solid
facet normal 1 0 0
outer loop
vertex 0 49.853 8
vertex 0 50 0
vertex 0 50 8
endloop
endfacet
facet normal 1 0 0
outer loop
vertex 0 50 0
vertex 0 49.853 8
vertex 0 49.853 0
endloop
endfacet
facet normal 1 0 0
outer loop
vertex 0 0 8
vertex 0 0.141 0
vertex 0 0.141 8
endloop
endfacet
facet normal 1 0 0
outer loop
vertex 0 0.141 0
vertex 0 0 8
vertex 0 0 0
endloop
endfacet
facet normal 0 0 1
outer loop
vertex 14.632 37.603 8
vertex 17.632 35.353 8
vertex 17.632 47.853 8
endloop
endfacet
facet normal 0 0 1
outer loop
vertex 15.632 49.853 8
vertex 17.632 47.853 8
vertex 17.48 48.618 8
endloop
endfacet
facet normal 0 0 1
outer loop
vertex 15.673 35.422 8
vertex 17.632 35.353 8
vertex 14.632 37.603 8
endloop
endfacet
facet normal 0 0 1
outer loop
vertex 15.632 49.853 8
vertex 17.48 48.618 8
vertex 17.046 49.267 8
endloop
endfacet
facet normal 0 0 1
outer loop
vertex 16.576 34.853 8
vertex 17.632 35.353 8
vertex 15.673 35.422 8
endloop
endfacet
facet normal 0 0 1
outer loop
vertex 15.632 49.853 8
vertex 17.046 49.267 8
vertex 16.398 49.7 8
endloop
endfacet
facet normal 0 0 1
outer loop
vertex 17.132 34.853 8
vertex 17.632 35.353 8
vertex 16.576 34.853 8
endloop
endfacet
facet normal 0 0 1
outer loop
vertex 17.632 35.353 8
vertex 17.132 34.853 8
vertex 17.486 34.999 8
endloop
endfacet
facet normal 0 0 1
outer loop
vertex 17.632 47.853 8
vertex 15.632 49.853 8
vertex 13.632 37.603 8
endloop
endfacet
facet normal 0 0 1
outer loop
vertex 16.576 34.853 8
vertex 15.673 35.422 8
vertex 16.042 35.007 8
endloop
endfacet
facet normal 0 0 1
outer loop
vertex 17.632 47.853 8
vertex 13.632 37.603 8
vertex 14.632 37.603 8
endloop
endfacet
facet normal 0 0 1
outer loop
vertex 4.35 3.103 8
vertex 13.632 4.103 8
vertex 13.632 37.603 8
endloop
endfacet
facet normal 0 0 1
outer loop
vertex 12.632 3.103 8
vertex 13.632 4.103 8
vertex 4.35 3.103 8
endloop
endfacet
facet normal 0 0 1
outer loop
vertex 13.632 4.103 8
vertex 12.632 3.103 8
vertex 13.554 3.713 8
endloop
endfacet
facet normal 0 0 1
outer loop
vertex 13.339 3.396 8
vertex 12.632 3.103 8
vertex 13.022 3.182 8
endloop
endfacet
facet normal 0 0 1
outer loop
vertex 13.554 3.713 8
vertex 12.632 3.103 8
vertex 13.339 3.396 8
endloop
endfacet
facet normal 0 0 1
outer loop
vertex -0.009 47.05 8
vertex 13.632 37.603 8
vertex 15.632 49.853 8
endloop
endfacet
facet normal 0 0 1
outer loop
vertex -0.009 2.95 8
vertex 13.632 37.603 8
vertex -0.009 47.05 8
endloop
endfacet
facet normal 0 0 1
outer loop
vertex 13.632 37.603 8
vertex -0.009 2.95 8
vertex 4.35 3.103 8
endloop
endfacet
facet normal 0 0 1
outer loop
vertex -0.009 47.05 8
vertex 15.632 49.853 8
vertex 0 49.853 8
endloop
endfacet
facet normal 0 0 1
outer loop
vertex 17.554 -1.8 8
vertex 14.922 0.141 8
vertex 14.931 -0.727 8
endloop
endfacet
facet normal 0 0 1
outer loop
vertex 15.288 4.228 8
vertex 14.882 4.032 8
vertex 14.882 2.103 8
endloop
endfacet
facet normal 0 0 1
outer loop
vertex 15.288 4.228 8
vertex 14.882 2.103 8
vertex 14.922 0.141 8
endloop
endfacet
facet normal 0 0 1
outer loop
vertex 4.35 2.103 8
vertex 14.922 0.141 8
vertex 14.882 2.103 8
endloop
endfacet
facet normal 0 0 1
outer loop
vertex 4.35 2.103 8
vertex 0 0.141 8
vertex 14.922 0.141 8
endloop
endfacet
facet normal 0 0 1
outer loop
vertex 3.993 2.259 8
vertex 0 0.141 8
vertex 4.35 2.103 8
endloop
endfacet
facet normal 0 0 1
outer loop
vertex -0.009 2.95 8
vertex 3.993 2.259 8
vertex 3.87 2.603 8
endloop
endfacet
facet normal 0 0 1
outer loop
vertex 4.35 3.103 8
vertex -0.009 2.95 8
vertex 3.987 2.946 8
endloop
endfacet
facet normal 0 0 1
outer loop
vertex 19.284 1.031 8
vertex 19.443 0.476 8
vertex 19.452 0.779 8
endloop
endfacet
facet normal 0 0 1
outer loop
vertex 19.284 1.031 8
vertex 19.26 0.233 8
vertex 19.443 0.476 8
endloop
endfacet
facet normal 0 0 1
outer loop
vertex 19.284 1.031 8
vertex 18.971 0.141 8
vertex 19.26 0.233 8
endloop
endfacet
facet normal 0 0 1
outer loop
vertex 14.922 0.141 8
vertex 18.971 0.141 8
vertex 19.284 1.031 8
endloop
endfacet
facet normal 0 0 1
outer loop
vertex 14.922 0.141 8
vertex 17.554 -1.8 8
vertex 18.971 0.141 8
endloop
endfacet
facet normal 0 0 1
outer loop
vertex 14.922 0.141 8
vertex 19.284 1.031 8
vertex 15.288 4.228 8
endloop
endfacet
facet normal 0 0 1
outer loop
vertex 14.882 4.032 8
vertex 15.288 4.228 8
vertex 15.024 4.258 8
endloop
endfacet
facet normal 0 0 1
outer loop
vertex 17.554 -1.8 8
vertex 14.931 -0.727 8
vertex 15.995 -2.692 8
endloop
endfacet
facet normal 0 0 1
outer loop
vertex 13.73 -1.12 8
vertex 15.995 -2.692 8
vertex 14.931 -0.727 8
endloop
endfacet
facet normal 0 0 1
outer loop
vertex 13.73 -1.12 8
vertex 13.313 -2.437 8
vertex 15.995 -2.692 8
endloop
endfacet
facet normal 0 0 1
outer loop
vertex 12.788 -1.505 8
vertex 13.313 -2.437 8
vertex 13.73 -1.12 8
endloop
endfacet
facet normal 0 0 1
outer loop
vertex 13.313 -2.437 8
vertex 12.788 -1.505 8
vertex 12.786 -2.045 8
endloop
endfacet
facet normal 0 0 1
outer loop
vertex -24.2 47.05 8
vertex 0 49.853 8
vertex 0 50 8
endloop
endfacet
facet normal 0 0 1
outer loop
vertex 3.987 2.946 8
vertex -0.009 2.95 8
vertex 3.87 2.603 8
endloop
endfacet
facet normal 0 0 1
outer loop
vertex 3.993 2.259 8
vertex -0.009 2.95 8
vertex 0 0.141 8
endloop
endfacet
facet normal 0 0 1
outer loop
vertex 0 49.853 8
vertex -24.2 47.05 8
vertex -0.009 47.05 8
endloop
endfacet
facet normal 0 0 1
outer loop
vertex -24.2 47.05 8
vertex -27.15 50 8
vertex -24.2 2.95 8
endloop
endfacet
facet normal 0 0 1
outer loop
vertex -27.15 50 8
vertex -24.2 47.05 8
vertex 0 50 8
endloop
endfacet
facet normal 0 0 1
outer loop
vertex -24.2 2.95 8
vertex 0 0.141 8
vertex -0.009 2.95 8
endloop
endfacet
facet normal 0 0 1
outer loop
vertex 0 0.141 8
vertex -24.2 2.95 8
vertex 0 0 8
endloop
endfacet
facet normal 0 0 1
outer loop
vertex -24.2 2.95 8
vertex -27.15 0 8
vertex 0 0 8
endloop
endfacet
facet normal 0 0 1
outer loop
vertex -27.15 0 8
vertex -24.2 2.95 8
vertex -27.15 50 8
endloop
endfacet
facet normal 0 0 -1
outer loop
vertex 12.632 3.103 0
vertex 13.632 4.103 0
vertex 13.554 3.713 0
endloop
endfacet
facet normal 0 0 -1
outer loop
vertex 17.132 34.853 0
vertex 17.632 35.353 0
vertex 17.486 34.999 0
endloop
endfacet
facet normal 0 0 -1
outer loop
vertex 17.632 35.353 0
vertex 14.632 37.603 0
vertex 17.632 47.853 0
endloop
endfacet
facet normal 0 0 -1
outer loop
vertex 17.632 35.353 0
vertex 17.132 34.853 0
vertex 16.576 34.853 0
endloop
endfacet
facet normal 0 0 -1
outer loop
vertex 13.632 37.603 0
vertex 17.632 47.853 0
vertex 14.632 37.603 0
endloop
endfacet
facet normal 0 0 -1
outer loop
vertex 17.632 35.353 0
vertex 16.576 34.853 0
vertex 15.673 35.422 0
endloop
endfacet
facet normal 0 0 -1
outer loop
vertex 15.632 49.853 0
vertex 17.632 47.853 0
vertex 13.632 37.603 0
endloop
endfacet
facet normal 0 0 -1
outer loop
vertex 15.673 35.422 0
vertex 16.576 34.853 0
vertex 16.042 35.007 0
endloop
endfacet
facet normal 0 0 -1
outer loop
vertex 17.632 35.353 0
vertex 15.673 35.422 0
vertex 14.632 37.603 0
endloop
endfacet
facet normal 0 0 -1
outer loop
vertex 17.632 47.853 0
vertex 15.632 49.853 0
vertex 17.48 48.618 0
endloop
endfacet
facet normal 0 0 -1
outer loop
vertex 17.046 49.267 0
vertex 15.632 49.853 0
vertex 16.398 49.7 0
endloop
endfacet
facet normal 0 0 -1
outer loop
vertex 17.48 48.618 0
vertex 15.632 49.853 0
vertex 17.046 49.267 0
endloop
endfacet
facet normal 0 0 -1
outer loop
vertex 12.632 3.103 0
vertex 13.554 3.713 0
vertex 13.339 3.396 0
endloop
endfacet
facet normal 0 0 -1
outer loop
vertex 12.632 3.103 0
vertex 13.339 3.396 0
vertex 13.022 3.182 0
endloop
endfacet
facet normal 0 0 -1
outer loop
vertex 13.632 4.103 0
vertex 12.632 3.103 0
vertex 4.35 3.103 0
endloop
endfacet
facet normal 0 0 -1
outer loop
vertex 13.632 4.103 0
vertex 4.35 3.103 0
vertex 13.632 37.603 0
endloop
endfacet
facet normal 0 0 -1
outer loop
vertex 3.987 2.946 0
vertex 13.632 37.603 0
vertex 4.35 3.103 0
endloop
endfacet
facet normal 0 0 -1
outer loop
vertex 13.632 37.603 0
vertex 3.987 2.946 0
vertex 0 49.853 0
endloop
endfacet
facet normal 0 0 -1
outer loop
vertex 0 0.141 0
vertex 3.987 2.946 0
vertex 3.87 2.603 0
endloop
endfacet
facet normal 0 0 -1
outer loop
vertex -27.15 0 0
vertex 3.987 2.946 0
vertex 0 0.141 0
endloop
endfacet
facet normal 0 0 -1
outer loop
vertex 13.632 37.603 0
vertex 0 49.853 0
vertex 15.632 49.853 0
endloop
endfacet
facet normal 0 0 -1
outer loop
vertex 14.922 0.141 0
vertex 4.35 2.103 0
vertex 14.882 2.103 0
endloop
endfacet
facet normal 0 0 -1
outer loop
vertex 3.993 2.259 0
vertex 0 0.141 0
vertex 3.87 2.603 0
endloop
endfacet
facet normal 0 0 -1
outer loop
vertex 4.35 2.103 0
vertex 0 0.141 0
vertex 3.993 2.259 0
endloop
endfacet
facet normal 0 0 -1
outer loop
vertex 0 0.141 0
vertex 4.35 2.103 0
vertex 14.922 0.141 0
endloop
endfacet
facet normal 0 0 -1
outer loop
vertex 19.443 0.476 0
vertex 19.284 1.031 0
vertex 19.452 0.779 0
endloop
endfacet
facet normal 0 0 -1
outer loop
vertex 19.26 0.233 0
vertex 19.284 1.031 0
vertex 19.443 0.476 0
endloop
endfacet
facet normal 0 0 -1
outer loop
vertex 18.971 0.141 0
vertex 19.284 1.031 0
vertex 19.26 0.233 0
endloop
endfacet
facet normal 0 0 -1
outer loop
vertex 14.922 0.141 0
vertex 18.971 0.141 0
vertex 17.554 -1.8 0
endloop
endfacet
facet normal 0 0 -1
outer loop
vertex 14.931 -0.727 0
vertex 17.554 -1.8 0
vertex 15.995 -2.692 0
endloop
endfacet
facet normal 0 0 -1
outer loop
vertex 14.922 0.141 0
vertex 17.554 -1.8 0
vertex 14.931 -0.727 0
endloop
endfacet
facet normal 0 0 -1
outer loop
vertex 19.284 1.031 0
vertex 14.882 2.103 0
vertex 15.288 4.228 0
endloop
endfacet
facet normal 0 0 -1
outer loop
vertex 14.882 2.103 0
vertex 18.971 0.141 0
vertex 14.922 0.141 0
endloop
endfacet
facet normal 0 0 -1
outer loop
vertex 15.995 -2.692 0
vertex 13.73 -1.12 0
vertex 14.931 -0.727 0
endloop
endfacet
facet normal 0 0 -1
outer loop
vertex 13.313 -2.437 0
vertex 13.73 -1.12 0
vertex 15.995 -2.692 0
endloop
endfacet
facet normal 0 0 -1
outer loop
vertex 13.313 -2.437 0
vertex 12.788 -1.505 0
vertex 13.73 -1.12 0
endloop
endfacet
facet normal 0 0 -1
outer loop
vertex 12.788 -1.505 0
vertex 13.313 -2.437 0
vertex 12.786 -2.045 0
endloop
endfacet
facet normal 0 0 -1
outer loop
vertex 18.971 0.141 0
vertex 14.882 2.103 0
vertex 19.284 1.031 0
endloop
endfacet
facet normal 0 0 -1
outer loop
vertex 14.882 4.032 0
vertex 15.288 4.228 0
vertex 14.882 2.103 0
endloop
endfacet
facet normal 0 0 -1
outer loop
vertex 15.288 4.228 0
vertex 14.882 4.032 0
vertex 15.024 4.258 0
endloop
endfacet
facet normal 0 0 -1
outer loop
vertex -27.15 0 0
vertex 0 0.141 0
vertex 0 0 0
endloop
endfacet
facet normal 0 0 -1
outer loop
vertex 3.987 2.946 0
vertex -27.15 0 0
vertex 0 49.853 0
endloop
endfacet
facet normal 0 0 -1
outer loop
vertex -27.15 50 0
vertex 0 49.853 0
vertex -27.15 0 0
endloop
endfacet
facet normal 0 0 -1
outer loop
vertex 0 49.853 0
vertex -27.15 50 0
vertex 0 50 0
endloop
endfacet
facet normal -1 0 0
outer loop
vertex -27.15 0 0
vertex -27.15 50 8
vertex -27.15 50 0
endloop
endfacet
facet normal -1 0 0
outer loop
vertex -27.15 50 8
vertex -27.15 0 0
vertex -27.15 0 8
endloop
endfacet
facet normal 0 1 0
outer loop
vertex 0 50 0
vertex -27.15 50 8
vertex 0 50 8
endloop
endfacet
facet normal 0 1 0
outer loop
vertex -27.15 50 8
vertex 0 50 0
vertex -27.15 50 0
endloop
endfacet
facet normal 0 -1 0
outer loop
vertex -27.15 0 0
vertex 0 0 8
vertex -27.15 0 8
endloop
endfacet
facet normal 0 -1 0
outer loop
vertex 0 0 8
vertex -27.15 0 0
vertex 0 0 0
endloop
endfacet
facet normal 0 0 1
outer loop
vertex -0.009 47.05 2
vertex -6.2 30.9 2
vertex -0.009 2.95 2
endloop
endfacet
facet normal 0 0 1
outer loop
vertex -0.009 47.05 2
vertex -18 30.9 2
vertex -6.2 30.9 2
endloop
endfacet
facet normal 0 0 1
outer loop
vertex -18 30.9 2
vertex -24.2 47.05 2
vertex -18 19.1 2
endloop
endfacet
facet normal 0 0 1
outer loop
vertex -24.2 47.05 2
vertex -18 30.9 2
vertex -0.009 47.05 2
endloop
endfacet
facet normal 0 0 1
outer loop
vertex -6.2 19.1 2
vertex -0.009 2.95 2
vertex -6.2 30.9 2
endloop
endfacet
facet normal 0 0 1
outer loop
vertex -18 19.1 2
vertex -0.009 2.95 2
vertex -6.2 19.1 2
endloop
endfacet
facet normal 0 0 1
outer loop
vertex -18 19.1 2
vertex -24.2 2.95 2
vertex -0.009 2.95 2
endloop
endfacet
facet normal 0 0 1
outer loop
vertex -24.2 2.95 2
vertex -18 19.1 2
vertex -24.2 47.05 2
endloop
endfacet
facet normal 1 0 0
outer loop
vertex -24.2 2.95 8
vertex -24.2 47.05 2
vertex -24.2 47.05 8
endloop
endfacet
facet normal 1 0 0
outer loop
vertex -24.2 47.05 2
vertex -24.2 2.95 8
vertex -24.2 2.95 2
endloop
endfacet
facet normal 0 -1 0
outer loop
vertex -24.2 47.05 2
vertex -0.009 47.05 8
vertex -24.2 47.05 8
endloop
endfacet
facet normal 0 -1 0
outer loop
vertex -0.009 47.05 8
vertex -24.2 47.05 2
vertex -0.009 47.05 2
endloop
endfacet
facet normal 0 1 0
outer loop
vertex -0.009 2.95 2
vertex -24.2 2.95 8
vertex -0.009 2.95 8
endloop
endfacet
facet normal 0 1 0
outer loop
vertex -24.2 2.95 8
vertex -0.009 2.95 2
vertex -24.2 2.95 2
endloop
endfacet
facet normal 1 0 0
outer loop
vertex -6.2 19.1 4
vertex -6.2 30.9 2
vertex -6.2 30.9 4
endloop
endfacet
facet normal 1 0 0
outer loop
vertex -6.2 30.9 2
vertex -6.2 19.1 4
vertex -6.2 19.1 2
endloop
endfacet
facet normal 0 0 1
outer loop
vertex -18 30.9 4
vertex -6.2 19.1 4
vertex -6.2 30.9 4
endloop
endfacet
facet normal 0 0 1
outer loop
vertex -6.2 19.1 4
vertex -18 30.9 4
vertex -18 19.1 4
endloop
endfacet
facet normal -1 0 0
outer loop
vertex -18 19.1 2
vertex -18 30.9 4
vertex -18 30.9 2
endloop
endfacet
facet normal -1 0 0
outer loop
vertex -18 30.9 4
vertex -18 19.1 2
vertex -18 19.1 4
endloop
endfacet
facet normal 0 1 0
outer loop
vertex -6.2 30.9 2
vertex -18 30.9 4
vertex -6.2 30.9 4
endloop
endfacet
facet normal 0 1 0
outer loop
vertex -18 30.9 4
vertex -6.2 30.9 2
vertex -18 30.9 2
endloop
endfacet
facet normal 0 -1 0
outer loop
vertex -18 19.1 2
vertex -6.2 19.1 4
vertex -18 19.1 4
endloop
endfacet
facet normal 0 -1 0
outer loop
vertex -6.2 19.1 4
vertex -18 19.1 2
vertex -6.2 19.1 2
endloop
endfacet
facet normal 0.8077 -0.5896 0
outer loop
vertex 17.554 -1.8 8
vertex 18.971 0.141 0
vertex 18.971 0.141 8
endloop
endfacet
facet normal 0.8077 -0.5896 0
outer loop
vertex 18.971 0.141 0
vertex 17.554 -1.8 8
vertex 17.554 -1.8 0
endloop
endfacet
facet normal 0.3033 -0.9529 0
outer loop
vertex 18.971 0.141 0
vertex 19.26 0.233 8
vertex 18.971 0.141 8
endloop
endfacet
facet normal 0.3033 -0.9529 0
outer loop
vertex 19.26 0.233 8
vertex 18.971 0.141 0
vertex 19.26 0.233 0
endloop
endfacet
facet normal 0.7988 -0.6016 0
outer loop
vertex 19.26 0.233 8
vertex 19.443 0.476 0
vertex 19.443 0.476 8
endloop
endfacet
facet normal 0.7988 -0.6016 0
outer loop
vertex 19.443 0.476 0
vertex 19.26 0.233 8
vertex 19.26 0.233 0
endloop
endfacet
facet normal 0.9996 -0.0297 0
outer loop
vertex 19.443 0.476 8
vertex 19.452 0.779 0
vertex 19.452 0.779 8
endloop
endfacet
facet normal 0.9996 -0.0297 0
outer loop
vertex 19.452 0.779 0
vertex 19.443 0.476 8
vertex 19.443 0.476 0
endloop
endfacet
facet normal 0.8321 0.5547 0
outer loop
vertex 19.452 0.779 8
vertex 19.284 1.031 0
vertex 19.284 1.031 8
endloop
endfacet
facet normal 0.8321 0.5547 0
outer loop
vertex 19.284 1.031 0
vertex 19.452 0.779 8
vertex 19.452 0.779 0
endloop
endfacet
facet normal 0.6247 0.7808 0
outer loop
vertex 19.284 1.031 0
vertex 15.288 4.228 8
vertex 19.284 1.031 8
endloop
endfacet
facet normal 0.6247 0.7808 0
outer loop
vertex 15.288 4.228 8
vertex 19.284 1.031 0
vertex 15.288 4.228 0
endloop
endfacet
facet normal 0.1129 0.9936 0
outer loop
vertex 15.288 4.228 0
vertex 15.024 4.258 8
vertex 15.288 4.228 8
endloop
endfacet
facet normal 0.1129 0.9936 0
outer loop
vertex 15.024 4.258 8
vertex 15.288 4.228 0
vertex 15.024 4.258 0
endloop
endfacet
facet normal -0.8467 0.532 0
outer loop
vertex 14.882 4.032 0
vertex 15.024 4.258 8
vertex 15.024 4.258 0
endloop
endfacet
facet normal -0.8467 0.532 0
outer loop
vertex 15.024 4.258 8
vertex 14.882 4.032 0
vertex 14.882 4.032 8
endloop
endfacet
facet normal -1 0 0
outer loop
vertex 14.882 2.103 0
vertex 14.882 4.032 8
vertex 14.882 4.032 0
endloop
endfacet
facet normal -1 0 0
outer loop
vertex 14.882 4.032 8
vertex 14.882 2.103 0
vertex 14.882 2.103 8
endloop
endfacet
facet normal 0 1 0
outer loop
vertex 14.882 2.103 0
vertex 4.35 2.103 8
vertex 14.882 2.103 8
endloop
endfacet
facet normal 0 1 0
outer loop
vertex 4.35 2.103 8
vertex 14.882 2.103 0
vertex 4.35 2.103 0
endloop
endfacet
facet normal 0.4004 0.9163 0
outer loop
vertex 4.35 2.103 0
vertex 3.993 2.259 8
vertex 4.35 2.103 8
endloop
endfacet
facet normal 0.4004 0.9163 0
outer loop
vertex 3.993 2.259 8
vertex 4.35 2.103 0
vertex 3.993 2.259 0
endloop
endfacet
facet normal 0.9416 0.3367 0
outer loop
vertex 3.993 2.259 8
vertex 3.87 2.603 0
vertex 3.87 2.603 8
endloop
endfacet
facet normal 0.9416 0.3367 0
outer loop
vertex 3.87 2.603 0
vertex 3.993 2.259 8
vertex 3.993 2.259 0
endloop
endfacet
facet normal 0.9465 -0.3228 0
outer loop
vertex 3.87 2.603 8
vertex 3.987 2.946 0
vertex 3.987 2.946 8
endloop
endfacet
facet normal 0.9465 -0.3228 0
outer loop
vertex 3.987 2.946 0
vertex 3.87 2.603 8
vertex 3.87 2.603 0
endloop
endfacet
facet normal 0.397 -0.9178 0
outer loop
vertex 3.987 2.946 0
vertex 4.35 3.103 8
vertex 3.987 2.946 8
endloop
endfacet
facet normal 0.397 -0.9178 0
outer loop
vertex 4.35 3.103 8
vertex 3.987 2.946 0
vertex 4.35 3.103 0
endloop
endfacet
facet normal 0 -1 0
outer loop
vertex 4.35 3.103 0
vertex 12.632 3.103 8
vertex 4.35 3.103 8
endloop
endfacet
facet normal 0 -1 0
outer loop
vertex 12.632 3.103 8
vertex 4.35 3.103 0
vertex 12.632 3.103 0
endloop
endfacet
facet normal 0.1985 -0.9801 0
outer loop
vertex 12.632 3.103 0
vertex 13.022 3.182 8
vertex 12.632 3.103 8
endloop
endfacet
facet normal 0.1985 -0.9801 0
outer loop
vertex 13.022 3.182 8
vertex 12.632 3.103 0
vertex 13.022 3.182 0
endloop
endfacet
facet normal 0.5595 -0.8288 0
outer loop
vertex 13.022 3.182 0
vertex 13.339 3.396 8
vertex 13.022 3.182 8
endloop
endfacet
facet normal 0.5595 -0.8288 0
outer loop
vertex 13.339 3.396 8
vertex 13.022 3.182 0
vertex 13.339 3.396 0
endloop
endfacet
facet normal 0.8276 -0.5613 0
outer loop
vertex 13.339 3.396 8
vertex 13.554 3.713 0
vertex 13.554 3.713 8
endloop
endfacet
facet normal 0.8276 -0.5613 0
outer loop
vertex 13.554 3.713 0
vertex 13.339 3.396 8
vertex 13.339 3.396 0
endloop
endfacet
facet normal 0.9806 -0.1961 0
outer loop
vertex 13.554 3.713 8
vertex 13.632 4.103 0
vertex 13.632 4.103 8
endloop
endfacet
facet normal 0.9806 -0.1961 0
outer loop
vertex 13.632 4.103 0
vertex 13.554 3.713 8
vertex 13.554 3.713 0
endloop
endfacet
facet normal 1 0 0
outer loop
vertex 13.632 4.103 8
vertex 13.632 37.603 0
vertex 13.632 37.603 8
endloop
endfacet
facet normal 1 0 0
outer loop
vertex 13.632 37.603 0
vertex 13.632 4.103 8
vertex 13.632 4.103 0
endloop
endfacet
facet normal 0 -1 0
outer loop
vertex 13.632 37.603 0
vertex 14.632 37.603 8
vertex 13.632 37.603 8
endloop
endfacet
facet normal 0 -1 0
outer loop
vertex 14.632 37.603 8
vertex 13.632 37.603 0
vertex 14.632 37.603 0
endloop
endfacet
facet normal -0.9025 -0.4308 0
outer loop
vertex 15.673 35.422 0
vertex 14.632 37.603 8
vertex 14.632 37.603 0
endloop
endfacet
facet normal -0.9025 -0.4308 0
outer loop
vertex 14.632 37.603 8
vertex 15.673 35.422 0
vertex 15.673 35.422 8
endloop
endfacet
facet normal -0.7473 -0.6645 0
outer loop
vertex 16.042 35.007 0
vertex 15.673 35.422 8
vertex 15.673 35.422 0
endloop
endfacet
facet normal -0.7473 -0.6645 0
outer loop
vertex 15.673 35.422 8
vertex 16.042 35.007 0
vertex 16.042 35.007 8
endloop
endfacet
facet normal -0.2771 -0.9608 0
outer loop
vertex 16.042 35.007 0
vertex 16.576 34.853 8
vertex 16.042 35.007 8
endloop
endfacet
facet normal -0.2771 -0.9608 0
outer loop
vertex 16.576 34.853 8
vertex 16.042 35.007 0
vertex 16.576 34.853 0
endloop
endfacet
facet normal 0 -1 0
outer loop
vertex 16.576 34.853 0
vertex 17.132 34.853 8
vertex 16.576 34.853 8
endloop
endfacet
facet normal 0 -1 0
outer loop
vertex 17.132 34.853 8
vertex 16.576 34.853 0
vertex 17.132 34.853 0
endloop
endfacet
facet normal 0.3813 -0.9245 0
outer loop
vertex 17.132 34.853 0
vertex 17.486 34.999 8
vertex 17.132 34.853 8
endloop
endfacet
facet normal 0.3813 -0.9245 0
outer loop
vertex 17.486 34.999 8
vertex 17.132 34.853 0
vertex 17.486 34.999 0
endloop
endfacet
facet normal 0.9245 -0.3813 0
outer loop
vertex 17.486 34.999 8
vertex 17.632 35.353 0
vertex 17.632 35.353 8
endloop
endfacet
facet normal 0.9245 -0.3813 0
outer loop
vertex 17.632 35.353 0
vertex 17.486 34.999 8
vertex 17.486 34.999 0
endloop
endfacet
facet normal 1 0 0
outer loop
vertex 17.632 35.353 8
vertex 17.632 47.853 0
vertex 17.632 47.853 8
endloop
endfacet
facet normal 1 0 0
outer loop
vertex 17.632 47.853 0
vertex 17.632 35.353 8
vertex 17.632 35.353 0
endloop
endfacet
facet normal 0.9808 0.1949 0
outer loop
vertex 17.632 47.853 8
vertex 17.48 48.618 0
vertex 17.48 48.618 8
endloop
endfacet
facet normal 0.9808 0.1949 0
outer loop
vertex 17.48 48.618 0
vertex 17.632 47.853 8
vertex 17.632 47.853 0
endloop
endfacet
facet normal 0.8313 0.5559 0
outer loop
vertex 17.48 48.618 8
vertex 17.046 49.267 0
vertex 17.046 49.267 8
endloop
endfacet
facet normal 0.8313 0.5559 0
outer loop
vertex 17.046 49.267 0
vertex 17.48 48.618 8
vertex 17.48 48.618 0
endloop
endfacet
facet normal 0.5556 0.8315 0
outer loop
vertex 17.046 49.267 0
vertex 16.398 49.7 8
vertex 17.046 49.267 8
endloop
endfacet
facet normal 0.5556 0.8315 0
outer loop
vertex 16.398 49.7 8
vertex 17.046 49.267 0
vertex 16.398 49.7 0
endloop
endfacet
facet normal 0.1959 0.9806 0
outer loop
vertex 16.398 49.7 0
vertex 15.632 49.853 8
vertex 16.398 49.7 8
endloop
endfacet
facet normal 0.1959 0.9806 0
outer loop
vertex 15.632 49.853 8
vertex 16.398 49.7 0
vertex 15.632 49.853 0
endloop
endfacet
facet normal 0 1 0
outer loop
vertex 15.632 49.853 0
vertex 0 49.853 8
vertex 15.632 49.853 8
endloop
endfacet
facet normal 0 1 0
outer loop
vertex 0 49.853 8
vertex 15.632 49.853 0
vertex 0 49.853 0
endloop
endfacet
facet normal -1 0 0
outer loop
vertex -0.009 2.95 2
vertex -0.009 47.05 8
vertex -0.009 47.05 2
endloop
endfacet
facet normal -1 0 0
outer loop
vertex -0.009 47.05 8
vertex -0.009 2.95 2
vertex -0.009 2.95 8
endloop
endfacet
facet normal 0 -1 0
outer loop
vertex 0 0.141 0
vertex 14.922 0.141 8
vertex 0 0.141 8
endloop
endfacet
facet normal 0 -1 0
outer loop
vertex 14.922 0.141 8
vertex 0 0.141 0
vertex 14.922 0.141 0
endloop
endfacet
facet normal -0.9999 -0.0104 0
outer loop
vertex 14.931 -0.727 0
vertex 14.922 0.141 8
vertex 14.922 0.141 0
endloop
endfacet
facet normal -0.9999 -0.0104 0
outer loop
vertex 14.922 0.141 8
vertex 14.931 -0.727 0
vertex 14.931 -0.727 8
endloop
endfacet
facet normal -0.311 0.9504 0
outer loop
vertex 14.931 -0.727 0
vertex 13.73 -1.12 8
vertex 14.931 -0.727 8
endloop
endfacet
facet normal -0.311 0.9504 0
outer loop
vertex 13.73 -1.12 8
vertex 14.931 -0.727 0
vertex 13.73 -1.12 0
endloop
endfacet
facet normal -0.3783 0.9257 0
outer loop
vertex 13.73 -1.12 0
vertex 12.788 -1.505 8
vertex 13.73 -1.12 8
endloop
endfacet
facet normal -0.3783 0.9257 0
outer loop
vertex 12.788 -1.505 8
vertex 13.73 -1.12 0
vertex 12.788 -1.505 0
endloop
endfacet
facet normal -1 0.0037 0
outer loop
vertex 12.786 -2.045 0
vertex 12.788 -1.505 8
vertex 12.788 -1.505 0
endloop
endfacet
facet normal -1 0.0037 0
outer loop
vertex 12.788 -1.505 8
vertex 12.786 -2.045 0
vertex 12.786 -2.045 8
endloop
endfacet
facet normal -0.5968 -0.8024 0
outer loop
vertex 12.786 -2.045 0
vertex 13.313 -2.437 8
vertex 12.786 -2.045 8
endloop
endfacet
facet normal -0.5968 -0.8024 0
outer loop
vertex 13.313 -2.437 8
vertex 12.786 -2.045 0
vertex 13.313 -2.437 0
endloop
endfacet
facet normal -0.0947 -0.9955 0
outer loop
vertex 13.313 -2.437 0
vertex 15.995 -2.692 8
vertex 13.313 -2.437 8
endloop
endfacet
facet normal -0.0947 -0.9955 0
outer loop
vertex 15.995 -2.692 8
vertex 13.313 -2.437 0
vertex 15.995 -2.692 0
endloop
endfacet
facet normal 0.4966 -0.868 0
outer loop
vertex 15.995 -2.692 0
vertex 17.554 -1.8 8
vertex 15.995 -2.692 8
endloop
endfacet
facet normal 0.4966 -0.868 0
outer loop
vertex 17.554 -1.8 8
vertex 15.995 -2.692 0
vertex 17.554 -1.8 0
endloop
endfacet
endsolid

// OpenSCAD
pcbHeight = 2;
solderHeight = 2;
wallHeight = 2;
baseHeight = 2;
dinClipLength = 50;

pcbLength = 44.1;
pcbWidth = 24.2;

wallWidth = (dinClipLength - pcbLength) / 2;

dinWidth = pcbHeight + solderHeight + wallHeight + baseHeight;

module din_clip() {
	translate([-.15,0,0])linear_extrude(height=dinWidth, convexity=5) {
		import(file="../din_clip_01a.dxf", layer="0", $fn=64);
	}
}

din_clip();

translate([-pcbWidth - wallWidth, 0, 0]) {
    difference() {
        cube([pcbWidth + wallWidth, pcbLength + 2 * wallWidth, baseHeight + solderHeight + pcbHeight + wallHeight]); 
        translate([wallWidth, wallWidth, baseHeight]) {
            cube([pcbWidth, pcbLength, solderHeight + pcbHeight + wallHeight + 0.01]);
        }
    }
    translate([wallWidth + pcbWidth / 2 - 2 * wallWidth, wallWidth + pcbLength /2 - 2 * wallWidth, baseHeight]) {
        cube([4 * wallWidth, 4 * wallWidth, solderHeight]);
    }
}
